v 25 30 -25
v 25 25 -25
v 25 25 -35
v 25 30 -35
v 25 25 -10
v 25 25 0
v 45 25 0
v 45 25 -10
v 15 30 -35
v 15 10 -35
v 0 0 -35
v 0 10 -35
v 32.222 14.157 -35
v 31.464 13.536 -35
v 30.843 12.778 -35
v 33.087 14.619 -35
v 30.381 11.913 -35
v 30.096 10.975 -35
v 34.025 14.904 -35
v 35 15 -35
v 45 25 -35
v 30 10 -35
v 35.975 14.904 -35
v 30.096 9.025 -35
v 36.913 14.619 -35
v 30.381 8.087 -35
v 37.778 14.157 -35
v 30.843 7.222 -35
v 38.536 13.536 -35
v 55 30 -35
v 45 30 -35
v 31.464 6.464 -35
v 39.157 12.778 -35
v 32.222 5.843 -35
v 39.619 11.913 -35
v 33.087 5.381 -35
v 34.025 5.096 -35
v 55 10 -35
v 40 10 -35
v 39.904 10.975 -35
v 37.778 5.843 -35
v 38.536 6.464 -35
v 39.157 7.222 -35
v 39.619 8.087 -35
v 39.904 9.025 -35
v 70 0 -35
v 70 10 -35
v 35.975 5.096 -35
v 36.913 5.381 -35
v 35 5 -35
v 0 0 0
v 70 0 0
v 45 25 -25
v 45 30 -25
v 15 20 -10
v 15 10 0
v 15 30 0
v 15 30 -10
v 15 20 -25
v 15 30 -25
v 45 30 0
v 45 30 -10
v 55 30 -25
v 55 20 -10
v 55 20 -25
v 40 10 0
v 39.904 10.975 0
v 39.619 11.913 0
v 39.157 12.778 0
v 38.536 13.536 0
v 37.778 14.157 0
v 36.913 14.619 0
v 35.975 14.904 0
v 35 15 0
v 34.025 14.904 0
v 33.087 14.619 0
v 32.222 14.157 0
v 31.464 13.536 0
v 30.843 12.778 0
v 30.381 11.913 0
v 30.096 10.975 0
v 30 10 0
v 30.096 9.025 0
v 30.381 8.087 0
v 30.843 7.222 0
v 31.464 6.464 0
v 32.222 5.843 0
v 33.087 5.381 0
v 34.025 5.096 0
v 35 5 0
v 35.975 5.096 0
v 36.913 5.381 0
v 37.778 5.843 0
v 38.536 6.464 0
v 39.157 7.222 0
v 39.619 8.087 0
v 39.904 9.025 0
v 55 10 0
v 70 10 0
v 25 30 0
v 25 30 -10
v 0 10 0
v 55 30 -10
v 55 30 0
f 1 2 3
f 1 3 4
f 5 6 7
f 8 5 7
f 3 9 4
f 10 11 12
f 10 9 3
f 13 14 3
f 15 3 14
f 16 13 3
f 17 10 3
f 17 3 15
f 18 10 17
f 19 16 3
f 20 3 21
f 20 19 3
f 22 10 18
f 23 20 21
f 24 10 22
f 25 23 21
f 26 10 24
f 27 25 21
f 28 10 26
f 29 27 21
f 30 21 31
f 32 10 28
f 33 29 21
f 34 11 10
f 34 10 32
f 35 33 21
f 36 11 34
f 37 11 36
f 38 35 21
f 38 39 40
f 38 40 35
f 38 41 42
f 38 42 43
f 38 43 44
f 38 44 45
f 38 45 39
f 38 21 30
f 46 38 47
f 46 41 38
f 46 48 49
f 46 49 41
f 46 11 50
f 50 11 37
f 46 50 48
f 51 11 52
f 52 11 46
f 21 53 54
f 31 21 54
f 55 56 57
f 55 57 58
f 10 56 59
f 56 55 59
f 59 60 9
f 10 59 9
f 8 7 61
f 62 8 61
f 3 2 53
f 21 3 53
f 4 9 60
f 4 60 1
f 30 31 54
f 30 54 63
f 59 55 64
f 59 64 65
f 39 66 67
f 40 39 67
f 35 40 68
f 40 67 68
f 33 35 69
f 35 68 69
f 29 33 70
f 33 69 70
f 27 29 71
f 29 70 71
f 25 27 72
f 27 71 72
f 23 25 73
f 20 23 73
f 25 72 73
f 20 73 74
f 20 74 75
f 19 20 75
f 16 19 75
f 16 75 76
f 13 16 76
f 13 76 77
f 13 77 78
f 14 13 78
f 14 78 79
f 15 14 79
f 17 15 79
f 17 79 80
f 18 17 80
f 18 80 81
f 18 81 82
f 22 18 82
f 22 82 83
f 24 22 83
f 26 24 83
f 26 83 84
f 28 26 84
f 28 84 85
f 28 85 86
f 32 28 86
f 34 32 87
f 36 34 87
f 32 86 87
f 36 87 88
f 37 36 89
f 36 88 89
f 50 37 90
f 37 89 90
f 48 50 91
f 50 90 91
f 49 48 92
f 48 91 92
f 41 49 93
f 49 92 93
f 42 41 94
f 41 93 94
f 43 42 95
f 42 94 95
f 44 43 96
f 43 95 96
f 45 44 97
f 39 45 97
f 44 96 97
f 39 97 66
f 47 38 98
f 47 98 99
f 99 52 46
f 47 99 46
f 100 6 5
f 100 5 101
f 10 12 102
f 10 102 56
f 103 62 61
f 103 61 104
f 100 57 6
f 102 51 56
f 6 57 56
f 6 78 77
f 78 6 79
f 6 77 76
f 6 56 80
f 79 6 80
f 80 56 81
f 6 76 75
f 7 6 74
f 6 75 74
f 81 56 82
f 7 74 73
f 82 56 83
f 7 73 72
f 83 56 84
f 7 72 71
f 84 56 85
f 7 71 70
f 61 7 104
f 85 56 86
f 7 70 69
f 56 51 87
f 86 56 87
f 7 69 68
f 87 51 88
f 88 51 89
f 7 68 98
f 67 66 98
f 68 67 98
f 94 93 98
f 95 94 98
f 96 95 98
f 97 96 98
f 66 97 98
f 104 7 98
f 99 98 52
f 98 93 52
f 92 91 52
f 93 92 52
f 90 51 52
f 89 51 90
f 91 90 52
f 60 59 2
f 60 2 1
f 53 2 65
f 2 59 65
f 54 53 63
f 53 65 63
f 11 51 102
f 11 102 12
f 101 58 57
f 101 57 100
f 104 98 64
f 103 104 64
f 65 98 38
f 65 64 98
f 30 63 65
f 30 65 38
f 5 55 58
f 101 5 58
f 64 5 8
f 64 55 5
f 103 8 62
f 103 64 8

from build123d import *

# Parameters (mm, degrees)
SKETCH1_W           = 70
SKETCH1_H           = 35
BOSS_EXTRUDE1_DEPTH = 30
SKETCH2_W           = 15
SKETCH2_H           = 35
CUT_EXTRUDE1_DEPTH  = 20
SKETCH3_W           = 15
SKETCH3_H           = 35
CUT_EXTRUDE2_DEPTH  = 20
SKETCH4_W           = 15
SKETCH4_H           = 10
CUT_EXTRUDE3_DEPTH  = 41
SKETCH6_W           = 20
SKETCH6_H           = 5
CUT_EXTRUDE4_DEPTH  = 41
SKETCH7_R           = 5
CUT_EXTRUDE5_DEPTH  = 36


with BuildPart() as part:
    # Sketch1 → Boss-Extrude1 (new body)
    with BuildSketch(Plane(origin=(0, 0, 0), x_dir=(1, 0, 0), z_dir=(0, 1, 0))):
        with Locations((35, 17.5)):
            Rectangle(SKETCH1_W, SKETCH1_H)
    extrude(amount=BOSS_EXTRUDE1_DEPTH)

    # Sketch2 → Cut-Extrude1 (cut)
    with BuildSketch(Plane(origin=(0, 30, 0), x_dir=(1, 0, 0), z_dir=(0, 1, 0))):
        with Locations((7.5, 17.5)):
            Rectangle(SKETCH2_W, SKETCH2_H)
    extrude(amount=-CUT_EXTRUDE1_DEPTH, mode=Mode.SUBTRACT)

    # Sketch3 → Cut-Extrude2 (cut)
    with BuildSketch(Plane(origin=(0, 30, 0), x_dir=(1, 0, 0), z_dir=(0, 1, 0))):
        with Locations((62.5, 17.5)):
            Rectangle(SKETCH3_W, SKETCH3_H)
    extrude(amount=-CUT_EXTRUDE2_DEPTH, mode=Mode.SUBTRACT)

    # Sketch4 → Cut-Extrude3 (cut)
    with BuildSketch(Plane(origin=(55, 0, 0), x_dir=(0, 0, -1), z_dir=(1, 0, 0))):
        with Locations((17.5, 25)):
            Rectangle(SKETCH4_W, SKETCH4_H)
    extrude(amount=-CUT_EXTRUDE3_DEPTH, mode=Mode.SUBTRACT)

    # Sketch6 → Cut-Extrude4 (cut)
    with BuildSketch(Plane.XY):
        with Locations((35, 27.5)):
            Rectangle(SKETCH6_W, SKETCH6_H)
    extrude(amount=-CUT_EXTRUDE4_DEPTH, mode=Mode.SUBTRACT)

    # Sketch7 → Cut-Extrude5 (cut, through all)
    with BuildSketch(Plane.XY):
        with Locations((35, 10)):
            Circle(SKETCH7_R)
    extrude(amount=-CUT_EXTRUDE5_DEPTH, mode=Mode.SUBTRACT)


solid = part.part
